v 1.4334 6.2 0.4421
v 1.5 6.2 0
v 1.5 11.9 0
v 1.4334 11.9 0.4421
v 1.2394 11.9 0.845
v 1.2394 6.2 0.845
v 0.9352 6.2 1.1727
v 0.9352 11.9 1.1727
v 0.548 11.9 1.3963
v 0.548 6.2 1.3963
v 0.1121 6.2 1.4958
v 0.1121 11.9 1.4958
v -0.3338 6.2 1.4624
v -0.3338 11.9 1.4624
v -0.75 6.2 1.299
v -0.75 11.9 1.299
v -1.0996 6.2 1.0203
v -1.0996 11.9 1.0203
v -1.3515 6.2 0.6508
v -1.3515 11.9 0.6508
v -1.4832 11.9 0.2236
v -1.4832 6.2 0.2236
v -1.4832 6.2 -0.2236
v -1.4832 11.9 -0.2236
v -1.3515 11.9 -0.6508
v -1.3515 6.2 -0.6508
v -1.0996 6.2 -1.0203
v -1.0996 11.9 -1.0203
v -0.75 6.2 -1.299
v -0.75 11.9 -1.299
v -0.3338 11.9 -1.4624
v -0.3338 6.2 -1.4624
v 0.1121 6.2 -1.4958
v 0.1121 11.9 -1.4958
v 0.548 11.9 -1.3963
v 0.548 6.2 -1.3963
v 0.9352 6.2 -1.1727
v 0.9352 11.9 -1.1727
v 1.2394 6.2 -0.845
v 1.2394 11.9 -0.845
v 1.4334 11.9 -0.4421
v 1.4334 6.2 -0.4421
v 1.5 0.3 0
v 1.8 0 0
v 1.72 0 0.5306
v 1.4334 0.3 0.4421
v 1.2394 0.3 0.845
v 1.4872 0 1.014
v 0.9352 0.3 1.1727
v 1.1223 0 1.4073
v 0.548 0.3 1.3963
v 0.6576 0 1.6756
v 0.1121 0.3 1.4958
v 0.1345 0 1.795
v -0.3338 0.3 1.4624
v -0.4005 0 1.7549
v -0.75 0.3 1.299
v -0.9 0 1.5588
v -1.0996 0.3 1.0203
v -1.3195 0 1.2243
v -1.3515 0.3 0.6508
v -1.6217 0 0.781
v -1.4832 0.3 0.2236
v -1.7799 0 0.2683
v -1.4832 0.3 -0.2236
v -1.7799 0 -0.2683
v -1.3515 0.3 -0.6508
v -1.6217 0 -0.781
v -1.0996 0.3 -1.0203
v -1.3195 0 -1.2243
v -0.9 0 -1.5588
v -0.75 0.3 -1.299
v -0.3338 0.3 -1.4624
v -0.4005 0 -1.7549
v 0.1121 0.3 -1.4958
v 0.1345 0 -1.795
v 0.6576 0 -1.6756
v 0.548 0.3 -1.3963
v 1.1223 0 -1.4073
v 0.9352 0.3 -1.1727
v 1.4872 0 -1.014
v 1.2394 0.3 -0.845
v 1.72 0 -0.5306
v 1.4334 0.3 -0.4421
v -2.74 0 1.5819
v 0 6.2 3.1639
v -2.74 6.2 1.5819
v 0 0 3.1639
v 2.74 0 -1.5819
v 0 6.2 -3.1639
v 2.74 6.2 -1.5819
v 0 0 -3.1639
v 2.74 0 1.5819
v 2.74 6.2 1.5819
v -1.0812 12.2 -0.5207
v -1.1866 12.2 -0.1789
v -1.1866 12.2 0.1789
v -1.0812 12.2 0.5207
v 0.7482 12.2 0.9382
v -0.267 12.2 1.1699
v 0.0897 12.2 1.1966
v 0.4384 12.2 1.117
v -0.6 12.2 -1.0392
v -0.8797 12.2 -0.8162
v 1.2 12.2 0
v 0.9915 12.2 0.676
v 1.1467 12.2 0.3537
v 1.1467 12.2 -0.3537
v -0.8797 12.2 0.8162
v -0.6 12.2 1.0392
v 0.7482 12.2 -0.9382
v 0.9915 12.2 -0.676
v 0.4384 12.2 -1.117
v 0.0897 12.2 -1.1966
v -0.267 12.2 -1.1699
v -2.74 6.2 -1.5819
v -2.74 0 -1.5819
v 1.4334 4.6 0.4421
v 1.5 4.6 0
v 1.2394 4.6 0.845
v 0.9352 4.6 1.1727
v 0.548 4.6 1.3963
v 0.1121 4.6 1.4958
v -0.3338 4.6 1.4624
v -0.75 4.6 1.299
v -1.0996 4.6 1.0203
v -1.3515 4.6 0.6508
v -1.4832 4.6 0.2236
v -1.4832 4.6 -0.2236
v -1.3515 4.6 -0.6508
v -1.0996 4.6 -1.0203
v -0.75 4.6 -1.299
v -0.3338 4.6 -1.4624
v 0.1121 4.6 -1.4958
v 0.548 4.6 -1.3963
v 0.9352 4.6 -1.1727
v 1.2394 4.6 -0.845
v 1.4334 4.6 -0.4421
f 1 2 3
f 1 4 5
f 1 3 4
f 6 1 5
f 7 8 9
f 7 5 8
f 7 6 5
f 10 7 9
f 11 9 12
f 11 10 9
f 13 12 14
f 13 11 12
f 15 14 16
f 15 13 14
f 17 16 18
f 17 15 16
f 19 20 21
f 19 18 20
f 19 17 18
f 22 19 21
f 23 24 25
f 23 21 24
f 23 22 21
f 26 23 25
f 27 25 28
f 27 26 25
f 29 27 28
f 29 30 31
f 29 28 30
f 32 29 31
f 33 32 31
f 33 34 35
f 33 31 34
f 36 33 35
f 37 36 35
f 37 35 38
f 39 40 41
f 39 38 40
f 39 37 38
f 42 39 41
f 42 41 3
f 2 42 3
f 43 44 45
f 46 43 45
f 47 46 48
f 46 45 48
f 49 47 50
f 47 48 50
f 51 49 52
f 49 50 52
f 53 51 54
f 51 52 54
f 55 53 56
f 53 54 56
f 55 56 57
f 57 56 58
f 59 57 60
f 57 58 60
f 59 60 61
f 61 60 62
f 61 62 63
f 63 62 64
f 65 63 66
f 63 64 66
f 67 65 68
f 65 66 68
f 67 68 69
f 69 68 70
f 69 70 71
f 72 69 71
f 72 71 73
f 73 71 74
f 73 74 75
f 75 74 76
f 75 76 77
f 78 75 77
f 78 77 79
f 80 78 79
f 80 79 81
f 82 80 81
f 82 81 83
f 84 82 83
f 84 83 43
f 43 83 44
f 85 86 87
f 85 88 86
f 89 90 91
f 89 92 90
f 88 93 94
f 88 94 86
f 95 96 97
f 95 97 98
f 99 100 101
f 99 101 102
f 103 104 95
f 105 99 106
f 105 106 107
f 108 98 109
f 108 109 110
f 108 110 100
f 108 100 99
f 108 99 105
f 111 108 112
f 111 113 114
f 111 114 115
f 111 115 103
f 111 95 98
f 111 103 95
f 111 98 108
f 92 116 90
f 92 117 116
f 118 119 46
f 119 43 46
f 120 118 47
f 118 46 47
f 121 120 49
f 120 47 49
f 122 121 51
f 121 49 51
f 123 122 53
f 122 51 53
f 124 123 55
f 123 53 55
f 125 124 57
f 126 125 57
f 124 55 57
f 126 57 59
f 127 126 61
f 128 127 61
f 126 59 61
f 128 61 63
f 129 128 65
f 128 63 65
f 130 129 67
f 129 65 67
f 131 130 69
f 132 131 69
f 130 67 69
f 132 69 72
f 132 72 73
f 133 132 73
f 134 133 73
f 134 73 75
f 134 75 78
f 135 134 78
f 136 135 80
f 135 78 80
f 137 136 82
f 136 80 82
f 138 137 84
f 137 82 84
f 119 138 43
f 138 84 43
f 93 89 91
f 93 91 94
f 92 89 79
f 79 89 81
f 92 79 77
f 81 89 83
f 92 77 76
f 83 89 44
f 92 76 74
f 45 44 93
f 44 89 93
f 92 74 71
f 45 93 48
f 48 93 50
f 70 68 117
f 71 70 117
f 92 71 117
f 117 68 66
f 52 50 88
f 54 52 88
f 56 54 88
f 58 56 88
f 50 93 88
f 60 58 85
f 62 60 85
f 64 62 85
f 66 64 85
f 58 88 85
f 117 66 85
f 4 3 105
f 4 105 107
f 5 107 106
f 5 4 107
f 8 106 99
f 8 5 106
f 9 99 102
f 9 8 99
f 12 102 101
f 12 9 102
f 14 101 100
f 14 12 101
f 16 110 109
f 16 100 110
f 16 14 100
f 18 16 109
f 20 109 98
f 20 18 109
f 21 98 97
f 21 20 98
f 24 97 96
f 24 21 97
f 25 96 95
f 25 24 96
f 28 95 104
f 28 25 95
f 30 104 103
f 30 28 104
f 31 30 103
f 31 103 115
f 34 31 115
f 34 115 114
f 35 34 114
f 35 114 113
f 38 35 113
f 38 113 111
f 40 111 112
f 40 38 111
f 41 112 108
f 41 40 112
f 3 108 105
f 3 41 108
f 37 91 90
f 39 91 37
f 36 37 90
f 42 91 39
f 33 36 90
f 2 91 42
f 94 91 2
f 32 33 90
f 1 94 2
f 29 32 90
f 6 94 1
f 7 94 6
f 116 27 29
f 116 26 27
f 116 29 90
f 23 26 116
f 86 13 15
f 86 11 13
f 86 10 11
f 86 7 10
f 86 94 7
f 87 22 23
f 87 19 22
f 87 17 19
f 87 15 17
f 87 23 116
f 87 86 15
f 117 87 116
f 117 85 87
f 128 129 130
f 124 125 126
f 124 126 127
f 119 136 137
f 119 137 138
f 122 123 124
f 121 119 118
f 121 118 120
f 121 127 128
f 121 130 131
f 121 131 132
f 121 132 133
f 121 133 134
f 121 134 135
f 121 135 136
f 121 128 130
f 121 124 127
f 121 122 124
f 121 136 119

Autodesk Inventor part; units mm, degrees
ref_plane "YZ Plane" through (0, 0, 0) normal (1, 0, 0) x (0, 1, 0)
ref_plane "XZ Plane" through (0, 0, 0) normal (0, 1, 0) x (-1, 0, 0)
ref_plane "XY Plane" through (0, 0, 0) normal (0, 0, 1) x (1, 0, 0)
sketch "Sketch1" plane through (0, 0, 0) normal (0, 1, 0) x (-1, 0, 0)
  line L0 (0, 3.1639) -> (2.74, 1.5819)
  line L1 (2.74, 1.5819) -> (2.74, -1.5819)
  line L2 (2.74, -1.5819) -> (0, -3.1639)
  line L3 (0, -3.1639) -> (-2.74, -1.5819)
  line L4 (-2.74, -1.5819) -> (-2.74, 1.5819)
  line L5 (-2.74, 1.5819) -> (0, 3.1639)
  point P0 (0, 0)
  point P1 (0, 0)
  dimension "d0" = 5.48
extrude "Extrusion1" add sketch "Sketch1" along normal blind 6.2
sketch "Sketch2" plane through (0, 6.2, 0) normal (0, 1, 0) x (1, 0, 0)
  circle A0 centre (0, 0) radius 1.5
  dimension "d3" = 3
extrude "Extrusion2" add sketch "Sketch2" along normal blind 6
thread "Thread1" size "M3x0.5" class "6g" standard "ANSI Metric M Profile" full length
chamfer "Chamfer1" distance 0.3 angle 45 1 edges at (-1.5, 12.2, 0)
sketch "Sketch3" plane through (0, 0, 0) normal (0, -1, 0) x (1, 0, 0)
  circle A0 centre (0, 0) radius 1.5
  dimension "d11" = 3
extrude "Extrusion3" cut sketch "Sketch3" against normal blind 4.6
thread "Thread2" size "M3x0.5" class "6H" standard "ANSI Metric M Profile" full length
chamfer "Chamfer2" distance 0.3 angle 45 1 edges at (-1.5, 0, 0)
properties part number "20mm_support"
